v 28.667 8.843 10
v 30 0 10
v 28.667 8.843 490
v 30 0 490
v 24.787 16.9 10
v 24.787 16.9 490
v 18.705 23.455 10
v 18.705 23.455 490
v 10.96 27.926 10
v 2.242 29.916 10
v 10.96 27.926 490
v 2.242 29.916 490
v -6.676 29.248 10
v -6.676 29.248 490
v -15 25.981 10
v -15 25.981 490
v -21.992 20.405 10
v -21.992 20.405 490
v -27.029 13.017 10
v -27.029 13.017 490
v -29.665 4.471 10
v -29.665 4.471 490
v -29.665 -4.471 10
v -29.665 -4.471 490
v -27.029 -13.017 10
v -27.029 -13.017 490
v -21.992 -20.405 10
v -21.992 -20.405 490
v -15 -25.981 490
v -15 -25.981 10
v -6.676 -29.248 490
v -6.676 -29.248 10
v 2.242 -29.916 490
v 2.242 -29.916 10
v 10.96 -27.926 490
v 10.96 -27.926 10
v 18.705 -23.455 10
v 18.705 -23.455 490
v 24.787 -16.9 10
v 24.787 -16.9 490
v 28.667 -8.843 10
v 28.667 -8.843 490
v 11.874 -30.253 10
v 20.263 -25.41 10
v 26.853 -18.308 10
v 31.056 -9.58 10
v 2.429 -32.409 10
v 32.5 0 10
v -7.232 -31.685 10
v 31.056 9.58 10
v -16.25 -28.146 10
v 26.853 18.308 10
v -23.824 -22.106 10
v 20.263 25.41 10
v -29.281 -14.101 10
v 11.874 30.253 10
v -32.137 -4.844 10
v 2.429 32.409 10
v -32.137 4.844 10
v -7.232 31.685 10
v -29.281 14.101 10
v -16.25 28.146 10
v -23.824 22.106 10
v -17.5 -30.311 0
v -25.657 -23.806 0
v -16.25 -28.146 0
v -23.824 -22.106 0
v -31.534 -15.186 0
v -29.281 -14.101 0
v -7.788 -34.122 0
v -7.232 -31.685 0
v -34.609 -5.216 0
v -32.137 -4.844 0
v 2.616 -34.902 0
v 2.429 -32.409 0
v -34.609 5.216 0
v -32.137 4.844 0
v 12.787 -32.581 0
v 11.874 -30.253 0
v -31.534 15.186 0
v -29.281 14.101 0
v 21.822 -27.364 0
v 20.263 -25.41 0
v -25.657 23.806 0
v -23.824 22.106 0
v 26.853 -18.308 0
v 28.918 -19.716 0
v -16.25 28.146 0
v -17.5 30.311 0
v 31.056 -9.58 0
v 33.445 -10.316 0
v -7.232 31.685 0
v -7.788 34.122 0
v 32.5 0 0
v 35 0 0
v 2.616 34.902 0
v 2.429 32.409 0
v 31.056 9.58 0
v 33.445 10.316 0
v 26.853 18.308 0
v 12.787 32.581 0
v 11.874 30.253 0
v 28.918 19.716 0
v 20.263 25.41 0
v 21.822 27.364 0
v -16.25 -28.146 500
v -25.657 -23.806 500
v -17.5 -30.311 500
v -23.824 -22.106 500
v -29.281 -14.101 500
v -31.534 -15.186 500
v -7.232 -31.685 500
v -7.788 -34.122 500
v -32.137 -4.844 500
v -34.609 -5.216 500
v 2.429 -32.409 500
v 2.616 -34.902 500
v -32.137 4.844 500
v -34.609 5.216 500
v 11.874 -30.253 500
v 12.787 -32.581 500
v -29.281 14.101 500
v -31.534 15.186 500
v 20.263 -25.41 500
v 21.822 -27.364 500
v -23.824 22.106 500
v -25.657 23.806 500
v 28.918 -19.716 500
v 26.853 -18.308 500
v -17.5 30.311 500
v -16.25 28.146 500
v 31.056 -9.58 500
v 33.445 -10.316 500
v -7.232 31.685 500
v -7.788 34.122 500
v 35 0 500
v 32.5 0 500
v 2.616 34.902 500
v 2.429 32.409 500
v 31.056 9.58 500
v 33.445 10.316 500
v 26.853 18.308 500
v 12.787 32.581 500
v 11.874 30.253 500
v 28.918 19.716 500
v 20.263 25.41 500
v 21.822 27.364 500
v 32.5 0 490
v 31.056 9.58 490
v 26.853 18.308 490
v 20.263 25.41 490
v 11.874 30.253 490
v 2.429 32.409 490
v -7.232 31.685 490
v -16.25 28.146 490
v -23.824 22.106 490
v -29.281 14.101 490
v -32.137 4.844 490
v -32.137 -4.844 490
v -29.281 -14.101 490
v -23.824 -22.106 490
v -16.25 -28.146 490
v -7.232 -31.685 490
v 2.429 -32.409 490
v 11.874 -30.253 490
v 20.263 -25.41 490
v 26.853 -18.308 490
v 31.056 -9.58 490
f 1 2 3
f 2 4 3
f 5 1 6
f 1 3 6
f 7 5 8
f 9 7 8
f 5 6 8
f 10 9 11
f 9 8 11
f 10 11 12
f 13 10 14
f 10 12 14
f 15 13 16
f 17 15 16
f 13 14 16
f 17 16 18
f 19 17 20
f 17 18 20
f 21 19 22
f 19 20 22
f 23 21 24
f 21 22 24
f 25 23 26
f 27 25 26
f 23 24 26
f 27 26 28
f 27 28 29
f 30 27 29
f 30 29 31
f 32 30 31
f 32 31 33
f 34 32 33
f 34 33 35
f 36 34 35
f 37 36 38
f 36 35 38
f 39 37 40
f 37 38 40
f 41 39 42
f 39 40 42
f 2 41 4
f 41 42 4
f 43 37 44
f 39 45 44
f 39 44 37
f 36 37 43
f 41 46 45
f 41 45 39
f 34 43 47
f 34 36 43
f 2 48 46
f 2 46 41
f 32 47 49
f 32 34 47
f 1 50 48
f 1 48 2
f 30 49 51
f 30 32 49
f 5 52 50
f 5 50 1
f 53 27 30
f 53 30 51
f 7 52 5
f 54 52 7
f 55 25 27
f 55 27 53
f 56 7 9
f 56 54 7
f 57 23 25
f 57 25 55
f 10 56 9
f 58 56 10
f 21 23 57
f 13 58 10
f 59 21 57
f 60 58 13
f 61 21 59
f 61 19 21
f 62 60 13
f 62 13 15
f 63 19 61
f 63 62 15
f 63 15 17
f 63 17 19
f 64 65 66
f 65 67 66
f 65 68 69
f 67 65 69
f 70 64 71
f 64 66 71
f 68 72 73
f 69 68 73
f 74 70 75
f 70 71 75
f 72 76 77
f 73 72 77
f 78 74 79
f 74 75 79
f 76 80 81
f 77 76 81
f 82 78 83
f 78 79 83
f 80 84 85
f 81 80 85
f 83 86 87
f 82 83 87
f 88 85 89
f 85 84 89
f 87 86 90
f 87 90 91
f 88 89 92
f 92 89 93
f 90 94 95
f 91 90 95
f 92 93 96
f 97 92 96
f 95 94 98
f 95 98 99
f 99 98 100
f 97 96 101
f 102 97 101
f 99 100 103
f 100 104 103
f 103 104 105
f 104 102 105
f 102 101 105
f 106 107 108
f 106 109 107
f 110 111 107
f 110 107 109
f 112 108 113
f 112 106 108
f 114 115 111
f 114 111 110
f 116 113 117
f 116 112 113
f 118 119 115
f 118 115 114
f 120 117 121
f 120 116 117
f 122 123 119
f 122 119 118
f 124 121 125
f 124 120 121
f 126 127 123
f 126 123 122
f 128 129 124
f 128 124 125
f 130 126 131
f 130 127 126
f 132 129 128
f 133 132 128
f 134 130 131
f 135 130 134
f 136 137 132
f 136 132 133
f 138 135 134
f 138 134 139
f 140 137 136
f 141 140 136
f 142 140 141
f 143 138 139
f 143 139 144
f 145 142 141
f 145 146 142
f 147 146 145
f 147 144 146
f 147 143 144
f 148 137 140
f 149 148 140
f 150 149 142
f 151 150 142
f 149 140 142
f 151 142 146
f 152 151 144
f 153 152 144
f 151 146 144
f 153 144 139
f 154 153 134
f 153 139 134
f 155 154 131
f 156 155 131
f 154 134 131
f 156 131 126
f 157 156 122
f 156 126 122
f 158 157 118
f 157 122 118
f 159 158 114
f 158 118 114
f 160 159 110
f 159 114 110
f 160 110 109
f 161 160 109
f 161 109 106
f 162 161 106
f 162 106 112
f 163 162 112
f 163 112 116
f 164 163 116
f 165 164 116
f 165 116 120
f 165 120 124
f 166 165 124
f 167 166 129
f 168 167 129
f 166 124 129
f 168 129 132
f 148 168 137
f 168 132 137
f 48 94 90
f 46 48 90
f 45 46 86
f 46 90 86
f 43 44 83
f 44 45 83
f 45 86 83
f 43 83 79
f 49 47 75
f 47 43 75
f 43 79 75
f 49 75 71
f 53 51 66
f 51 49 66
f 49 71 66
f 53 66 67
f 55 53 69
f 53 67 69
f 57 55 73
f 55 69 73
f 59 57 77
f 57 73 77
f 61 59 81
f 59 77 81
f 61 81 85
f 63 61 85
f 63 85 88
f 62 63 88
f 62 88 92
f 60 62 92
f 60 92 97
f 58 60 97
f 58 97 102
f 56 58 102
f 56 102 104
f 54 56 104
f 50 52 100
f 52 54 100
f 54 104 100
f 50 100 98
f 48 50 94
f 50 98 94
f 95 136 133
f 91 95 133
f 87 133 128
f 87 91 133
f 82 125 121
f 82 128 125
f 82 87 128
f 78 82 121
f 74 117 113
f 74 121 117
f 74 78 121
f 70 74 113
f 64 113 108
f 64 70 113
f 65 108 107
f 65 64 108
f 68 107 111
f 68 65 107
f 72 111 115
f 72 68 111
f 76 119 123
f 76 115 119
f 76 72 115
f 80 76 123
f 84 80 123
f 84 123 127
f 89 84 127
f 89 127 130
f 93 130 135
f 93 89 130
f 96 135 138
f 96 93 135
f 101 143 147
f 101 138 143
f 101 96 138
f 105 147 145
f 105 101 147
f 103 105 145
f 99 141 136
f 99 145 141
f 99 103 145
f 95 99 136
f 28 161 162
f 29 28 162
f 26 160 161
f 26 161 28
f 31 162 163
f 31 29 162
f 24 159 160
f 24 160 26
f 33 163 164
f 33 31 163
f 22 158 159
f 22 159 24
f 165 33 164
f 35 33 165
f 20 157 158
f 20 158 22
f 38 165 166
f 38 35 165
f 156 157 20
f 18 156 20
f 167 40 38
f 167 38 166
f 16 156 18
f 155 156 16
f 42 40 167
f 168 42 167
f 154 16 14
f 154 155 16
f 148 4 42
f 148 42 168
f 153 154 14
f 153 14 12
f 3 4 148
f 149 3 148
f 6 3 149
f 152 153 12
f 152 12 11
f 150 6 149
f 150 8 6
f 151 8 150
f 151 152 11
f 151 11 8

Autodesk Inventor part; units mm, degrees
ref_plane "YZ Plane" through (0, 0, 0) normal (1, 0, 0) x (0, 1, 0)
ref_plane "XZ Plane" through (0, 0, 0) normal (0, 1, 0) x (-1, 0, 0)
sketch "Sketch1" plane through (0, 0, 0) normal (0, 0, 1) x (1, 0, 0)
  circle A0 centre (0, 0) radius 35
  dimension "d0" = 70
extrude "Extrusion1" add sketch "Sketch1" along normal blind 500
sketch "Sketch2" plane through (0, 0, 500) normal (0, 0, 1) x (1, 0, 0)
  circle A0 centre (0, 0) radius 30
  dimension "d3" = 60
extrude "Extrusion2" cut sketch "Sketch2" against normal blind 500
sketch "Sketch3" plane through (0, 0, 500) normal (0, 0, 1) x (1, 0, 0)
  circle A0 centre (0, 0) radius 32.5
  dimension "d6" = 65
extrude "Extrusion3" cut sketch "Sketch3" against normal blind 10
ref_plane "Work Plane2" through (0, 0, 250) normal (0, 0, 1) x (1, 0, 0)
mirror "Mirror2" about plane through (0, 0, 250) normal (0, 0, 1) of "Extrusion3"
properties part number "project rolller 1 part2"
